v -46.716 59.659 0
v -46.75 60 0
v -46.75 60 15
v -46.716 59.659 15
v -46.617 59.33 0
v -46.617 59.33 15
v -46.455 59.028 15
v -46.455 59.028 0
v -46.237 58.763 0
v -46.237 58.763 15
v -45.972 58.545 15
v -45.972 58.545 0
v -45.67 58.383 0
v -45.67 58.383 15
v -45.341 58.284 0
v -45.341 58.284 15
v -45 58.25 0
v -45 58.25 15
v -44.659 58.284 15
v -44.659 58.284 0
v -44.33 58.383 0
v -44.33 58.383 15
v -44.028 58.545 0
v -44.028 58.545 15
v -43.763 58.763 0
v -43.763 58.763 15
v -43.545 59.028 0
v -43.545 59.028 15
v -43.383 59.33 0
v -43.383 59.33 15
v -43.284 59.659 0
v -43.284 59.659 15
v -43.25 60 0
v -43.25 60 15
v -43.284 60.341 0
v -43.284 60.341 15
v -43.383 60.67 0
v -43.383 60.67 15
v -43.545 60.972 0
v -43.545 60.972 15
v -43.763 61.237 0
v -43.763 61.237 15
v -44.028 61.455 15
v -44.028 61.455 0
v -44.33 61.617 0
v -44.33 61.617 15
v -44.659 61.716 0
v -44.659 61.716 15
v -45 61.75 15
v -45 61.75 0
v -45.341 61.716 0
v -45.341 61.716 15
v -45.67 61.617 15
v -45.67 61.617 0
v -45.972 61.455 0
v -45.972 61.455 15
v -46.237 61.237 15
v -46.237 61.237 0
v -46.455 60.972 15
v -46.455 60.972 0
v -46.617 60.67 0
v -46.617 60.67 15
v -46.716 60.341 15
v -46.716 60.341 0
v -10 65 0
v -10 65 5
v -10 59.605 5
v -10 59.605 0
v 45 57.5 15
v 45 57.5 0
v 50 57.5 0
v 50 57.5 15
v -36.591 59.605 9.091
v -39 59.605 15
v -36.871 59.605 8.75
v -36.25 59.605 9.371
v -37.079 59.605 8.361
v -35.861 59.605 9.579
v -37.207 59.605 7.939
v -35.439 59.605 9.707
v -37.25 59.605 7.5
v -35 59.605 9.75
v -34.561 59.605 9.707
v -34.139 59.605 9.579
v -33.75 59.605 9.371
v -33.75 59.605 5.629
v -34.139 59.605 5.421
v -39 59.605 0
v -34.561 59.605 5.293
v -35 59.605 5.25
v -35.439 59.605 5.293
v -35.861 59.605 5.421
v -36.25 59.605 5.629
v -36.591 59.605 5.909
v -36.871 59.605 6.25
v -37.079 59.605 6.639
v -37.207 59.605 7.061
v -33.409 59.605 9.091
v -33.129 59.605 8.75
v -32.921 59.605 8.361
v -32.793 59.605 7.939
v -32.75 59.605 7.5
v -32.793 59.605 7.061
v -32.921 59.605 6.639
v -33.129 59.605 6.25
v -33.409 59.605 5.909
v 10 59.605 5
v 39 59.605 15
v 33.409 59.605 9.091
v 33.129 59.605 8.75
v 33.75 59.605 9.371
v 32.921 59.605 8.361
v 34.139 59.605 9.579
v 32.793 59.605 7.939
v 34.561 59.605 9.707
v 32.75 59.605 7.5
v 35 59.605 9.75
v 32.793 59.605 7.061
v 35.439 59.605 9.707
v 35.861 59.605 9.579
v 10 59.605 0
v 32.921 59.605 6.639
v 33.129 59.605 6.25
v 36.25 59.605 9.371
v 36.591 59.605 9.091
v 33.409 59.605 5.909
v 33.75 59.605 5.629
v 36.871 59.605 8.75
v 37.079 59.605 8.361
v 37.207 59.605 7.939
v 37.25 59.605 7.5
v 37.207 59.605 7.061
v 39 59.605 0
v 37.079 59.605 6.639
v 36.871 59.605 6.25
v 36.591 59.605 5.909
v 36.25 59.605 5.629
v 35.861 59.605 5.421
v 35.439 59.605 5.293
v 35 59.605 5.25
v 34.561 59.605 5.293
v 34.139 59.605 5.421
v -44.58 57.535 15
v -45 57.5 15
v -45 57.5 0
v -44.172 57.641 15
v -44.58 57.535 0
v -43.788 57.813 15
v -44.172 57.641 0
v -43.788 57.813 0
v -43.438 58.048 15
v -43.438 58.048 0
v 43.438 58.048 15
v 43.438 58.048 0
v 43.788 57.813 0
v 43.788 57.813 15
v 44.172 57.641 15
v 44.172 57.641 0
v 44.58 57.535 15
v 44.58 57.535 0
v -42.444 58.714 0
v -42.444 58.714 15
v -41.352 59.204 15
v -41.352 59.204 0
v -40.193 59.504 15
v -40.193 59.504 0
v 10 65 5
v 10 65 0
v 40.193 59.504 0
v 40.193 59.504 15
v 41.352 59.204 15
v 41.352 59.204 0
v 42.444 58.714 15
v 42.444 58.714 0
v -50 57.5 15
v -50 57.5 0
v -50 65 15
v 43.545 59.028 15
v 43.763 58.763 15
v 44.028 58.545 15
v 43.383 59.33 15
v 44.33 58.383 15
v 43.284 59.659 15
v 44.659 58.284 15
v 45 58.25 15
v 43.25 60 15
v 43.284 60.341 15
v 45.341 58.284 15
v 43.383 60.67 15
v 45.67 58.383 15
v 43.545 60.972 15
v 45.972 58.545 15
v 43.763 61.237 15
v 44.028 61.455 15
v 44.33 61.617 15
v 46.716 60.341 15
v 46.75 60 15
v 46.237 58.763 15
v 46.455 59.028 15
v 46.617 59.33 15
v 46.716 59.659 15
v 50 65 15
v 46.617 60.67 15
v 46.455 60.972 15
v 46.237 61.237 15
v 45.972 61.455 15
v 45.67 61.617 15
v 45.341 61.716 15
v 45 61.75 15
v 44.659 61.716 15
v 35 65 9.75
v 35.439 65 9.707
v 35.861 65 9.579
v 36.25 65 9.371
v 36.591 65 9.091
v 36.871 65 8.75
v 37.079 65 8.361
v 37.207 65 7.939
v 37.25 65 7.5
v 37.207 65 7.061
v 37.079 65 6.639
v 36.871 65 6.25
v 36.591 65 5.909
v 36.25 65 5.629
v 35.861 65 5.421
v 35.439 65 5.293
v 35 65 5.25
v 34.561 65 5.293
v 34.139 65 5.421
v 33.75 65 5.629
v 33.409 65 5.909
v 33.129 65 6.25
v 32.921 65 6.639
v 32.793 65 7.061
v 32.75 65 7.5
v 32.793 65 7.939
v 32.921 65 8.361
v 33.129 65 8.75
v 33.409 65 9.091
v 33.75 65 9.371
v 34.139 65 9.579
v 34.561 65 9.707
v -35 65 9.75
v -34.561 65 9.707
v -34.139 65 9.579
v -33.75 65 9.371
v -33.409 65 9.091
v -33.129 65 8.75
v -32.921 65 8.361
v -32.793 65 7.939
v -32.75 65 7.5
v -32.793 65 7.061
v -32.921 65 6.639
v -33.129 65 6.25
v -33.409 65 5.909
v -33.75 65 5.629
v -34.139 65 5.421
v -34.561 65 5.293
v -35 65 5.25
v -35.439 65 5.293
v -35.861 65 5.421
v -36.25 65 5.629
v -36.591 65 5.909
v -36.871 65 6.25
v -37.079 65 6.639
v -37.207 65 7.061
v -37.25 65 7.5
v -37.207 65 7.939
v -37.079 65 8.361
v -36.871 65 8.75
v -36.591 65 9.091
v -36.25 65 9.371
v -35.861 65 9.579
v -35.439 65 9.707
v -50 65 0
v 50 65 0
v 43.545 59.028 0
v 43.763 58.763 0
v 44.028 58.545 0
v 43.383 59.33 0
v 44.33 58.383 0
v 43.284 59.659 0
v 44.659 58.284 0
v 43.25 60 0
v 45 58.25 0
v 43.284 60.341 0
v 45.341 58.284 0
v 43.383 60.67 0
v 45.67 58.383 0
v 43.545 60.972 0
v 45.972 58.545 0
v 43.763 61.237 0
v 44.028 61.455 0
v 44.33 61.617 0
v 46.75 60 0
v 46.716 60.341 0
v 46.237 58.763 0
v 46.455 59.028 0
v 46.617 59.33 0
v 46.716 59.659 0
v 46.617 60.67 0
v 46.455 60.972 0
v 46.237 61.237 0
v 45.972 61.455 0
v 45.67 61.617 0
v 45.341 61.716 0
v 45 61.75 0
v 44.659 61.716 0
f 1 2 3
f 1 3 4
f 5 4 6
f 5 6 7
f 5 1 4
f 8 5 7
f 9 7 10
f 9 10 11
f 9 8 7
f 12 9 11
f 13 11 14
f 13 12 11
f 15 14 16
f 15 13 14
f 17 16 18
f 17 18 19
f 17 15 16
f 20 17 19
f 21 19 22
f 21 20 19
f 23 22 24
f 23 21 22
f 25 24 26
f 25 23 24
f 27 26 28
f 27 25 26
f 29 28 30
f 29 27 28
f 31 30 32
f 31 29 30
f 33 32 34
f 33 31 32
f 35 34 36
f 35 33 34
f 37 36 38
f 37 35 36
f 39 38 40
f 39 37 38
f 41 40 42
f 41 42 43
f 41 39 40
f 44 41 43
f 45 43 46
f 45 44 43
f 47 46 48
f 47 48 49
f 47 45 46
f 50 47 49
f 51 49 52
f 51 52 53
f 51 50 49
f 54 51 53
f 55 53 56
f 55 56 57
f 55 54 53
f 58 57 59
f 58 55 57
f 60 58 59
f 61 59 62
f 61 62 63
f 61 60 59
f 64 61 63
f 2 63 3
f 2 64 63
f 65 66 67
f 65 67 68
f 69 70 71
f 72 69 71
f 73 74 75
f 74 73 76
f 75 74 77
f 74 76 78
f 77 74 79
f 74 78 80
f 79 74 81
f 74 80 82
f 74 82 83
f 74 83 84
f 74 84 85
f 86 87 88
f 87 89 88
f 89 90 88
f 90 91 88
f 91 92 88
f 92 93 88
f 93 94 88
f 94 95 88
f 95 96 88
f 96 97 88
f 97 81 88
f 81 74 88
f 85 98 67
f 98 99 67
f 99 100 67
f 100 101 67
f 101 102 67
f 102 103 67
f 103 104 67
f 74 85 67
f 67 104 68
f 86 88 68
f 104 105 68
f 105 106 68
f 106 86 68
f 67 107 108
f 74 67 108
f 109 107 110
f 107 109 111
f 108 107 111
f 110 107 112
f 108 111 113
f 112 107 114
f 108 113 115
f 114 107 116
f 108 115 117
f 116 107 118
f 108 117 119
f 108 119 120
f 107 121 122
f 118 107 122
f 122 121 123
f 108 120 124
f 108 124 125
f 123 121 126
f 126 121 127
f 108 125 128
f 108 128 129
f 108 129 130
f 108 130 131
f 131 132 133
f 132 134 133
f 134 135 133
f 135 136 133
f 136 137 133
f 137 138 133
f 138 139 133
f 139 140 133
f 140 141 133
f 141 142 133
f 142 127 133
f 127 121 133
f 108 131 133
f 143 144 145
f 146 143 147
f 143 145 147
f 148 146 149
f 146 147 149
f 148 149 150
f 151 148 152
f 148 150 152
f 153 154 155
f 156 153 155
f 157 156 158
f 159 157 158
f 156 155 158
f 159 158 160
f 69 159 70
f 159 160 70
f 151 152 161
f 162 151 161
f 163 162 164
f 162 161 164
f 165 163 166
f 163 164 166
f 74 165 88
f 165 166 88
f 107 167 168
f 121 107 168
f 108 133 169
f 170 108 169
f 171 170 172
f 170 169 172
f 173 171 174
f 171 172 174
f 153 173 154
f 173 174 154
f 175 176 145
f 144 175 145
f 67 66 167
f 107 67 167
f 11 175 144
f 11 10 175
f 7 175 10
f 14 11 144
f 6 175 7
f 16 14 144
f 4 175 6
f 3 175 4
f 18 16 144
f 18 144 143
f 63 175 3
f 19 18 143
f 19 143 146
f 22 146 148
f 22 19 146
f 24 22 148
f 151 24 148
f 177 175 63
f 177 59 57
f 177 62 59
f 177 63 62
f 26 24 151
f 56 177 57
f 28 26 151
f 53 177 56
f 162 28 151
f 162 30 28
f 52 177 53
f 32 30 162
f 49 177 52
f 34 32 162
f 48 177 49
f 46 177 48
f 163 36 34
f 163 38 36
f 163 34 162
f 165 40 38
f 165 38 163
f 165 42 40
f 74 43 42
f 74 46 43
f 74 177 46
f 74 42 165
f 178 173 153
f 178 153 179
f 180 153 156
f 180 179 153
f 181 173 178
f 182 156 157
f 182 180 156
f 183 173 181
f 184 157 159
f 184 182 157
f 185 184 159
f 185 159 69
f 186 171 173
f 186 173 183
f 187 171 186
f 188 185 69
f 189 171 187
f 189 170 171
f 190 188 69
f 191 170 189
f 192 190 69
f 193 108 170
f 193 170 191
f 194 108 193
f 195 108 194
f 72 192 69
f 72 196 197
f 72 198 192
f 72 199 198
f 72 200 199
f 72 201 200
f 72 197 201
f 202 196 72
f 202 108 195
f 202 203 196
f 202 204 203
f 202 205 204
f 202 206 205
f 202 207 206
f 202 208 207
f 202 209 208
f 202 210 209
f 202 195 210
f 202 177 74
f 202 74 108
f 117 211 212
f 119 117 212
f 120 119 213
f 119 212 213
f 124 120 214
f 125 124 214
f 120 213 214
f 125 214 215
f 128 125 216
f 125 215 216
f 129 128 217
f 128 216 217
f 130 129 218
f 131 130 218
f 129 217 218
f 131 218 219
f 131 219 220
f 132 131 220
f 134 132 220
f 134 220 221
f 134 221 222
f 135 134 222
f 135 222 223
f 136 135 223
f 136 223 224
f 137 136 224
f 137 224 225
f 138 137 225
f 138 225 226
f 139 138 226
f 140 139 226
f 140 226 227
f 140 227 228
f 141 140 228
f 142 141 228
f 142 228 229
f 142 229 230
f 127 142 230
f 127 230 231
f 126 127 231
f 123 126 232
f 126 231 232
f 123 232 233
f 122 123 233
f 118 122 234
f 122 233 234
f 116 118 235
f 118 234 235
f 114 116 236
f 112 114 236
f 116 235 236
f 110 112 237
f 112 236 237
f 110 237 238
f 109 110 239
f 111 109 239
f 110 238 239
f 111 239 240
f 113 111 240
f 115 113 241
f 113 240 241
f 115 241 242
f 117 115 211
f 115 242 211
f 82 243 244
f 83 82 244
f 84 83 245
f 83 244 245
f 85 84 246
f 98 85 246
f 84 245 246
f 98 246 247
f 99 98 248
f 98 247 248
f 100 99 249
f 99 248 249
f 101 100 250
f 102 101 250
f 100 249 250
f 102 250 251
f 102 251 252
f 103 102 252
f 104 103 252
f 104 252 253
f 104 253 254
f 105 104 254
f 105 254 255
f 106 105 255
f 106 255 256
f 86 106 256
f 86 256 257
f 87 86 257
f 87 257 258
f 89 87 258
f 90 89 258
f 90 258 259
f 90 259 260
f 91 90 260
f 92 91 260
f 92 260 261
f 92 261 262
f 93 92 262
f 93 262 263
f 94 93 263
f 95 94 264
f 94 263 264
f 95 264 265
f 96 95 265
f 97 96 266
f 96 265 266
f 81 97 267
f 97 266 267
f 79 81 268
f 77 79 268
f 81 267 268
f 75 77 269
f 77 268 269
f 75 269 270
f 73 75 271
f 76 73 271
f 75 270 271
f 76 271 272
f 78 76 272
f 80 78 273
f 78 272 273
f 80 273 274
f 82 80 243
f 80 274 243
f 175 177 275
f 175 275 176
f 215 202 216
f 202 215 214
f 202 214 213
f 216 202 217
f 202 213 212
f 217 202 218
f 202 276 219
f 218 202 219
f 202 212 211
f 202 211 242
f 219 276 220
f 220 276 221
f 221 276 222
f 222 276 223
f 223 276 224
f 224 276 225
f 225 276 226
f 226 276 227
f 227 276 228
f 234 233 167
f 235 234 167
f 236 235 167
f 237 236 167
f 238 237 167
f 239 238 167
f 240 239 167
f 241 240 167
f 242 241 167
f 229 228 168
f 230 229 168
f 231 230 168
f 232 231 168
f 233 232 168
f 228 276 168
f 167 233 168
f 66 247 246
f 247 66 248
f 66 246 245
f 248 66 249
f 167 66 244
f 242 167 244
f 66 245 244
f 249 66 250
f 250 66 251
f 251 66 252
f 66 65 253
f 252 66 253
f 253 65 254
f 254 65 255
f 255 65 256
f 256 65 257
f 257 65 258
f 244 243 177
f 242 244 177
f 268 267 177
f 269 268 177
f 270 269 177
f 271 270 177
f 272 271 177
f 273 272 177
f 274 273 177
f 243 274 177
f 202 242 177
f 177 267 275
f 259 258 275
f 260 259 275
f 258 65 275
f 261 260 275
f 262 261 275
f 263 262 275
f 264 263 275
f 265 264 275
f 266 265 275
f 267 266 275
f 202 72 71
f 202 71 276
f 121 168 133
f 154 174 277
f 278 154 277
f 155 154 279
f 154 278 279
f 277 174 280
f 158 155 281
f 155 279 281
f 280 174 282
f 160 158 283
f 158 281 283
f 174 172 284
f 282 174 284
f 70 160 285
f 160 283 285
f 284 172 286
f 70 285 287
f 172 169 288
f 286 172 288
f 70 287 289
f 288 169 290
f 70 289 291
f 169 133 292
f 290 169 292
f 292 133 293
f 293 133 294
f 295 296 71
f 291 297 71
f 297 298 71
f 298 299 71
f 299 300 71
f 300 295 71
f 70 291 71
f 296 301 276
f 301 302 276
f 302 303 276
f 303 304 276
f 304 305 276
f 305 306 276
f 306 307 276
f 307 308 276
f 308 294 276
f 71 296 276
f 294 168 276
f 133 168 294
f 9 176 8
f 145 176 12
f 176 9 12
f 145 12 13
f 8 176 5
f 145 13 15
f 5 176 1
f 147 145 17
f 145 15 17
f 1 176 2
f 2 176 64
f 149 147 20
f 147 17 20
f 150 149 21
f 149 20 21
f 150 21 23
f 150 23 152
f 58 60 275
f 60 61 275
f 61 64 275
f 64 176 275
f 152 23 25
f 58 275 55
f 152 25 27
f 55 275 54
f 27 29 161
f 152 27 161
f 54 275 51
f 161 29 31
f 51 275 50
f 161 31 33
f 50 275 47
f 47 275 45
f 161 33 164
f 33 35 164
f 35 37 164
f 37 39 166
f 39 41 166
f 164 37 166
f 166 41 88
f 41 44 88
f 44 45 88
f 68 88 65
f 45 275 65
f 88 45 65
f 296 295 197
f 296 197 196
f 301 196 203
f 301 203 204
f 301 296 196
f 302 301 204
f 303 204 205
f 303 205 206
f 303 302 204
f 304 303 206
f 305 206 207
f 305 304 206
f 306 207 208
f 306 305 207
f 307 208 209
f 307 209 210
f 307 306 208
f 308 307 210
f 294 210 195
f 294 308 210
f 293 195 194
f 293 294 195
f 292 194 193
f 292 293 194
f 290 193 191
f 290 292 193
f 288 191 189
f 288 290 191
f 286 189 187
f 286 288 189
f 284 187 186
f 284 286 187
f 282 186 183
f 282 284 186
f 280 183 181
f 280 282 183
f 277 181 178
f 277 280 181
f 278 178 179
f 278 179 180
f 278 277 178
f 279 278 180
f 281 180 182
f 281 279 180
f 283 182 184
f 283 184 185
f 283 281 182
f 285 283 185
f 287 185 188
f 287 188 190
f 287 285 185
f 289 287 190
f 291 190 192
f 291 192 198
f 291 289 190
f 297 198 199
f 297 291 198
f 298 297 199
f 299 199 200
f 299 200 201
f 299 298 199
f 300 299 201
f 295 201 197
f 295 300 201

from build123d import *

# Parameters (mm, degrees)
SKETCH1_R           = 1.75
BOSS_EXTRUDE1_DEPTH = 15
SKETCH2_R           = 2.25
SKETCH2_W           = 20
SKETCH2_H           = 5
CUT_EXTRUDE1_DEPTH  = 15


with BuildPart() as part:
    # Sketch1 → Boss-Extrude1 (new body)
    with BuildSketch(Plane.XY):
        with BuildLine():
            Line((50, 57.5), (50, 65))
            Line((50, 65), (-50, 65))
            Line((-50, 65), (-50, 57.5))
            Line((-50, 57.5), (-45, 57.5))
            ThreePointArc((-45, 57.5), (-44.172482646, 57.640929202), (-43.438262381, 58.047827976))
            ThreePointArc((-43.438262381, 58.047827976), (-41.351700501, 59.204183244), (-39, 59.604686356))
            Line((-39, 59.604686356), (39, 59.604686356))
            ThreePointArc((39, 59.604686356), (41.351700501, 59.204183244), (43.438262381, 58.047827976))
            ThreePointArc((43.438262381, 58.047827976), (44.172482646, 57.640929202), (45, 57.5))
            Line((45, 57.5), (50, 57.5))
        make_face()
        with Locations((45, 60)):
            Circle(SKETCH1_R, mode=Mode.SUBTRACT)
        with Locations(Location((-45, 60, 0), (0, 0, 180))):
            Circle(SKETCH1_R, mode=Mode.SUBTRACT)
    extrude(amount=BOSS_EXTRUDE1_DEPTH)

    # Sketch2 → Cut-Extrude1 (cut)
    with BuildSketch(Plane(origin=(0, 65, 0), x_dir=(1, 0, 0), z_dir=(0, 1, 0))):
        with Locations(Location((35, -7.5, 0), (0, 0, 270))):
            Circle(SKETCH2_R)
        with Locations(Location((-35, -7.5, 0), (0, 0, 270))):
            Circle(SKETCH2_R)
        with Locations((0, -2.5)):
            Rectangle(SKETCH2_W, SKETCH2_H)
    extrude(amount=-CUT_EXTRUDE1_DEPTH, mode=Mode.SUBTRACT)


solid = part.part
